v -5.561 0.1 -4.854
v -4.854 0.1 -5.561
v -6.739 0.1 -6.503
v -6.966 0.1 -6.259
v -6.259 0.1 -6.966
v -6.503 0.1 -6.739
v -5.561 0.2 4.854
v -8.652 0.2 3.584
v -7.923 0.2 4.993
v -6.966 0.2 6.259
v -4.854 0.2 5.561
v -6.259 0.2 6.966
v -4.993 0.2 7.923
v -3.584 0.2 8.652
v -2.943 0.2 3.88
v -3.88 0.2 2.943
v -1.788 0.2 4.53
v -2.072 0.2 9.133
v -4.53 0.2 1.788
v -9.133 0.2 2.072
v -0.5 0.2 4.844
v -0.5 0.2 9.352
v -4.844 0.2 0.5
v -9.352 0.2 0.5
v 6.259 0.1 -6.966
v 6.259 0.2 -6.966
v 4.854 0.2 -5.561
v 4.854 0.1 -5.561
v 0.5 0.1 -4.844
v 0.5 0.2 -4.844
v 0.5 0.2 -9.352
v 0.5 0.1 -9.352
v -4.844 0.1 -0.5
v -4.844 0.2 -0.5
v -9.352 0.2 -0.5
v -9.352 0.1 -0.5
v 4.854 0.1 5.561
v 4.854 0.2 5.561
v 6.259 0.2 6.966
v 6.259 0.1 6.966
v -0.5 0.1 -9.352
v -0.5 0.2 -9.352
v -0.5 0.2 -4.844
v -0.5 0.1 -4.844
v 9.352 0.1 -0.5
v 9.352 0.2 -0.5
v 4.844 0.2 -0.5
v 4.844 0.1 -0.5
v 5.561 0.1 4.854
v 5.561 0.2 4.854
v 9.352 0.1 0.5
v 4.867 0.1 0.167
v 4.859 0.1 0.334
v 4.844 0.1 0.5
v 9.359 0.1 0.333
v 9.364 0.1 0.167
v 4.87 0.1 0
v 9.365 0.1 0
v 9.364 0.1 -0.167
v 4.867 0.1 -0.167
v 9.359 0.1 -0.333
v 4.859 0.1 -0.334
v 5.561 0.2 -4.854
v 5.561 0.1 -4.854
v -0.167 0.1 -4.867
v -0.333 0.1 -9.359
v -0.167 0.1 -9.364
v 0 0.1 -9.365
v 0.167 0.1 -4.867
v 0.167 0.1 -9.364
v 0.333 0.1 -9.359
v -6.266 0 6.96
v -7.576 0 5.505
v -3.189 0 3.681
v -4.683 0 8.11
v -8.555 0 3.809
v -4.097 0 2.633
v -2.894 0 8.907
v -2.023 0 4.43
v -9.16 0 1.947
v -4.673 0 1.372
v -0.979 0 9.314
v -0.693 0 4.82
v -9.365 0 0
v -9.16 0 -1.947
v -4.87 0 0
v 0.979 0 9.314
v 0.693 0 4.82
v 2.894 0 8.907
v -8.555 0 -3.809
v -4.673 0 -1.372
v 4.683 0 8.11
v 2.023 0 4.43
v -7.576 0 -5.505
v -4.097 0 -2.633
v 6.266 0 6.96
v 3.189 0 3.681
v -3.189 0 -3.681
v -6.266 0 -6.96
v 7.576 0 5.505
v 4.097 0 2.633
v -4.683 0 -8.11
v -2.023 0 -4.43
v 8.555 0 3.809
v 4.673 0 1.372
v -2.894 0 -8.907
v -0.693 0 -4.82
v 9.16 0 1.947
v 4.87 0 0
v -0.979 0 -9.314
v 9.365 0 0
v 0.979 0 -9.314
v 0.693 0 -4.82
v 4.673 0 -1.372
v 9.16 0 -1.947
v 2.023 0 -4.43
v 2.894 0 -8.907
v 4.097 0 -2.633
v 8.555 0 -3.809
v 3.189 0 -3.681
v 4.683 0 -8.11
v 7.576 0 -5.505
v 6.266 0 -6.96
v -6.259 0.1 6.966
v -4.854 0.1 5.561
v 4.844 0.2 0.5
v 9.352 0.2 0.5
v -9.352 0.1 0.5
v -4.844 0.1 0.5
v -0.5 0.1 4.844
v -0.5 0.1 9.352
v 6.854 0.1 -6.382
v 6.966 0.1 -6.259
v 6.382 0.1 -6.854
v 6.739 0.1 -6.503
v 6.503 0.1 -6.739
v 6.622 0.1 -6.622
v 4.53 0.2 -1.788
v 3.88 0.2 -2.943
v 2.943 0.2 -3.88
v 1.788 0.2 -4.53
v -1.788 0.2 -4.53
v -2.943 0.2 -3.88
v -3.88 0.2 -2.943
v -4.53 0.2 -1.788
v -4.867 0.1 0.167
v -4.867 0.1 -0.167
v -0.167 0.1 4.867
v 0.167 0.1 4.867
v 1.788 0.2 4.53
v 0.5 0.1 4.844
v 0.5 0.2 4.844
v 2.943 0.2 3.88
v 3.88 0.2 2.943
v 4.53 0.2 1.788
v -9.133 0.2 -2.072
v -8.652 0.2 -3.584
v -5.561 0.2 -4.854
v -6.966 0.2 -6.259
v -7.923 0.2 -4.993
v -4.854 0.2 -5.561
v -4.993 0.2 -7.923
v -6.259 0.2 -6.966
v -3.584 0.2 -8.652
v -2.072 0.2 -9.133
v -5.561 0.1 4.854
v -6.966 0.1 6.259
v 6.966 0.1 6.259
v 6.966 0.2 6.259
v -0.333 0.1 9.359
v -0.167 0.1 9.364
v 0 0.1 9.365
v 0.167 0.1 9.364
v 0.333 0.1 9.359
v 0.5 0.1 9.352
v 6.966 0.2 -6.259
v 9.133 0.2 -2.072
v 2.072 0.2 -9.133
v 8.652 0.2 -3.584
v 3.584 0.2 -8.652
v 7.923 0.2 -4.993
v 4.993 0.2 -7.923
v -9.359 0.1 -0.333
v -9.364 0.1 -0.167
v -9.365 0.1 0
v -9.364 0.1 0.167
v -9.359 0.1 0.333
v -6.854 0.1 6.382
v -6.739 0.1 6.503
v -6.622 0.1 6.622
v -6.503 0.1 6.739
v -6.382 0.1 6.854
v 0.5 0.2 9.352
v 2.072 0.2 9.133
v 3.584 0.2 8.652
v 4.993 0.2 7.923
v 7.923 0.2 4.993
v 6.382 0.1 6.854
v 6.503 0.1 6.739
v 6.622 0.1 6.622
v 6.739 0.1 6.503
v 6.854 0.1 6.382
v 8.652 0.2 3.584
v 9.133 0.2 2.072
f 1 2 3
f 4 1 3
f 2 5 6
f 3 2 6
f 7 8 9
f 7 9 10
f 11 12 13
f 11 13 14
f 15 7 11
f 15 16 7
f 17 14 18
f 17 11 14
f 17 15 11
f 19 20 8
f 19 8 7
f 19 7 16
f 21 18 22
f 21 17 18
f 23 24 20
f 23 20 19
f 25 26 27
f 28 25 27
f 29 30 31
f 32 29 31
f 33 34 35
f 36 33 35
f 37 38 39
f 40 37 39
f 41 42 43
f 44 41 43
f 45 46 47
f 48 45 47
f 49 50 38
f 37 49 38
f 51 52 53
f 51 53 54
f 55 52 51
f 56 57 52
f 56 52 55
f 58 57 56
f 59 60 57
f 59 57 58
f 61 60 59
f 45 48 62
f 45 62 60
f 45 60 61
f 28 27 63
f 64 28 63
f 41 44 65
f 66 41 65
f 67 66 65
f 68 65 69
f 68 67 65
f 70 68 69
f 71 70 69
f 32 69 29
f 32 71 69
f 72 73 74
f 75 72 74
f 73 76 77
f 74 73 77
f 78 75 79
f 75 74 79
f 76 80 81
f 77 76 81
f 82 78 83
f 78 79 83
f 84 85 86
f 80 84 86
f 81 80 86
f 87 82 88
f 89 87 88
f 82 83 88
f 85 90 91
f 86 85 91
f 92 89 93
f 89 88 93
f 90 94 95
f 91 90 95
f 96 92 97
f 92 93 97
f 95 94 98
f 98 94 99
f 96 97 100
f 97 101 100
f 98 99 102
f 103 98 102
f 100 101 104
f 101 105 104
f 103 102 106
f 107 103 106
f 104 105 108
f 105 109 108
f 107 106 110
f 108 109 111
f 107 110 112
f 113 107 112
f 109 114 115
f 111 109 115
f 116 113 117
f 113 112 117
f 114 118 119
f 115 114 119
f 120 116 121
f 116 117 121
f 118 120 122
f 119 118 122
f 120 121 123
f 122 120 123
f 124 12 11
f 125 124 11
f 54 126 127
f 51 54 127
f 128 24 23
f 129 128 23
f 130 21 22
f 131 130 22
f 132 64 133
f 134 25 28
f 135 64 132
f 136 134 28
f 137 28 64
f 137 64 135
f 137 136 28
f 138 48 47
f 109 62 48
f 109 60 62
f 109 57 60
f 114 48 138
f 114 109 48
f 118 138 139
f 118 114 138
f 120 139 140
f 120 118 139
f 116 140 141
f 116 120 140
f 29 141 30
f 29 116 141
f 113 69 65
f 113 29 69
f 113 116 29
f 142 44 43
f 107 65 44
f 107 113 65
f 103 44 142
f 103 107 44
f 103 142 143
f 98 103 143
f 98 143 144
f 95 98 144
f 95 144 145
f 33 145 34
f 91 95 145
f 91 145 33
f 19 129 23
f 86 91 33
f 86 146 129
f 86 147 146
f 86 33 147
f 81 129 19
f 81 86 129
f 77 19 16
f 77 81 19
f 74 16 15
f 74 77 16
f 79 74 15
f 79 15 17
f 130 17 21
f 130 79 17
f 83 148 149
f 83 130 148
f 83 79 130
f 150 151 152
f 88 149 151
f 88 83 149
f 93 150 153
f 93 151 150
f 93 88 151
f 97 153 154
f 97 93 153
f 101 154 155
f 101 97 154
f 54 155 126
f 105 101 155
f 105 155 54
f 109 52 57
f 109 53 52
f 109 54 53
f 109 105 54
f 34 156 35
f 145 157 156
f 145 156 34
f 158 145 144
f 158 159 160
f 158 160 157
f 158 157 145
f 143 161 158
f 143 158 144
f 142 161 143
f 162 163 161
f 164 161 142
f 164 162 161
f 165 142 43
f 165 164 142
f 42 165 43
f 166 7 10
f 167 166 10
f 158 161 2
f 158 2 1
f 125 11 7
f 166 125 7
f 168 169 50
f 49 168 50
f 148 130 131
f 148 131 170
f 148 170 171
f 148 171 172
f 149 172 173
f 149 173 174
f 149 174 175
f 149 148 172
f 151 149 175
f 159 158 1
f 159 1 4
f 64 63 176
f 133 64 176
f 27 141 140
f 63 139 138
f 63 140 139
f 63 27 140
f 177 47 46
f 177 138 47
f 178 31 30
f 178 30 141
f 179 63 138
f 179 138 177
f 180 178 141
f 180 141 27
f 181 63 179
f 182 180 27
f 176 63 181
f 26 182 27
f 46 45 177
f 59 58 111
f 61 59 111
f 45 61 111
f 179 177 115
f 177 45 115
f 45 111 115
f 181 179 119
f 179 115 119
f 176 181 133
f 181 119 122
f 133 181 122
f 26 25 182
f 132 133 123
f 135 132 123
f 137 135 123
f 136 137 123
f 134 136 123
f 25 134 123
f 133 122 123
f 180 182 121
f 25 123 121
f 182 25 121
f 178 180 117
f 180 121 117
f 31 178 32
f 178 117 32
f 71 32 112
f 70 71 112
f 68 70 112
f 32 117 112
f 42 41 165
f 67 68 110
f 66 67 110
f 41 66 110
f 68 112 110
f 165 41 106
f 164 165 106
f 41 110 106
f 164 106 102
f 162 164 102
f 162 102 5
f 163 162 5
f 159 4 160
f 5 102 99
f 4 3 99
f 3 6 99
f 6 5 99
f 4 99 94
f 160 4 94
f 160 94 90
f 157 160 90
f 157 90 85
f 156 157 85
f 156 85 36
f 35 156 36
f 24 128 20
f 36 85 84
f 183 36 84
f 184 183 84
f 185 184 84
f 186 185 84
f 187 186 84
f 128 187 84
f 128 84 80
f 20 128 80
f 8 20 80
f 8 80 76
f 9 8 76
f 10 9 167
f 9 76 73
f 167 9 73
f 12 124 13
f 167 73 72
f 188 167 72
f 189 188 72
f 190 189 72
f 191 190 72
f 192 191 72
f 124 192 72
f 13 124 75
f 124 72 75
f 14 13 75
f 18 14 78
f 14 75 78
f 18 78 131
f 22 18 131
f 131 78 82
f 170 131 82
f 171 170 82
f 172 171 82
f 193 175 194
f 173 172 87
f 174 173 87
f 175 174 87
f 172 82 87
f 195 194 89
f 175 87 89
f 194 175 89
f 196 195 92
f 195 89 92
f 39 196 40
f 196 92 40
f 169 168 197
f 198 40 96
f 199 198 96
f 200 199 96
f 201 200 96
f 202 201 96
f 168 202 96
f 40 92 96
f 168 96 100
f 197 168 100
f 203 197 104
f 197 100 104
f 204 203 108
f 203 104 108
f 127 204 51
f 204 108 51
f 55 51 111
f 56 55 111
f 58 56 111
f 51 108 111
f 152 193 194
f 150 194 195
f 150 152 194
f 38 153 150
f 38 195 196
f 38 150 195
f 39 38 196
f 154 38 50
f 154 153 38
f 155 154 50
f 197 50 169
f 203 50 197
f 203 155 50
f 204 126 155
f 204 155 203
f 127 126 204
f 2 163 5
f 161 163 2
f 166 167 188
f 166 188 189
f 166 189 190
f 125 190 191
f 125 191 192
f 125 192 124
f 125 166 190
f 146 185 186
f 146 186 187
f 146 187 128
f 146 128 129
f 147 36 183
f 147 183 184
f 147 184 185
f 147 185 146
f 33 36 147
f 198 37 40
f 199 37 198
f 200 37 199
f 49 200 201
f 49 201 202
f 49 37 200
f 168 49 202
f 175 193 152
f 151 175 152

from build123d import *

# Parameters (mm, degrees)
CROQUIS2_R              = 9.365
CROQUIS2_R_2            = 4.87
SALIENTE_EXTRUIR1_DEPTH = 0.2
CORTAR_EXTRUIR1_DEPTH   = 0.1


with BuildPart() as part:
    # Croquis2 → Saliente-Extruir1 (new body)
    with BuildSketch(Plane(origin=(0, 0, 0), x_dir=(1, 0, 0), z_dir=(0, 1, 0))):
        Circle(CROQUIS2_R)
        Circle(CROQUIS2_R_2, mode=Mode.SUBTRACT)
    extrude(amount=SALIENTE_EXTRUIR1_DEPTH)

    # Croquis3 → Cortar-Extruir1 (cut)
    with BuildSketch(Plane(origin=(0, 0.2, 0), x_dir=(1, 0, 0), z_dir=(0, 1, 0))):
        with BuildLine():
            Line((-0.5, 9.351642904), (-0.5, 4.84426465))
            ThreePointArc((-0.5, 4.84426465), (0, 4.87), (0.5, 4.84426465))
            Line((0.5, 4.84426465), (0.5, 9.351642904))
            ThreePointArc((0.5, 9.351642904), (0.25008919, 9.36166013), (0, 9.365))
            ThreePointArc((0, 9.365), (-0.25008919, 9.36166013), (-0.5, 9.351642904))
        make_face()
        with BuildLine():
            ThreePointArc((0.5, -4.84426465), (0, -4.87), (-0.5, -4.84426465))
            Line((-0.5, -4.84426465), (-0.5, -9.351642904))
            ThreePointArc((-0.5, -9.351642904), (-0.25008919, -9.36166013), (0, -9.365))
            ThreePointArc((0, -9.365), (0.25008919, -9.36166013), (0.5, -9.351642904))
            Line((0.5, -9.351642904), (0.5, -4.84426465))
        make_face()
        with BuildLine():
            Line((-4.84426465, 0.5), (-9.351642904, 0.5))
            ThreePointArc((-9.351642904, 0.5), (-9.36166013, 0.25008919), (-9.365, 0))
            ThreePointArc((-9.365, 0), (-9.36166013, -0.25008919), (-9.351642904, -0.5))
            Line((-9.351642904, -0.5), (-4.84426465, -0.5))
            ThreePointArc((-4.84426465, -0.5), (-4.87, 0), (-4.84426465, 0.5))
        make_face()
        with BuildLine():
            Line((9.351642904, 0.5), (4.84426465, 0.5))
            ThreePointArc((4.84426465, 0.5), (4.863561907, 0.250330935), (4.87, 0))
            ThreePointArc((4.87, 0), (4.863561907, -0.250330935), (4.84426465, -0.5))
            Line((4.84426465, -0.5), (9.351642904, -0.5))
            ThreePointArc((9.351642904, -0.5), (9.36166013, -0.25008919), (9.365, 0))
            ThreePointArc((9.365, 0), (9.36166013, 0.25008919), (9.351642904, 0.5))
        make_face()
        with BuildLine():
            ThreePointArc((6.622055006, 6.622055006), (6.442853599, 6.796533124), (6.259056722, 6.966163503))
            Line((6.259056722, 6.966163503), (4.854288053, 5.561394834))
            Line((4.854288053, 5.561394834), (5.561394834, 4.854288053))
            Line((5.561394834, 4.854288053), (6.966163503, 6.259056722))
            ThreePointArc((6.966163503, 6.259056722), (6.796533124, 6.442853599), (6.622055006, 6.622055006))
        make_face()
        with BuildLine():
            Line((4.854288053, -5.561394834), (6.259056722, -6.966163503))
            ThreePointArc((6.259056722, -6.966163503), (6.442853599, -6.796533124), (6.622055006, -6.622055006))
            ThreePointArc((6.622055006, -6.622055006), (6.796533124, -6.442853599), (6.966163503, -6.259056722))
            Line((6.966163503, -6.259056722), (5.561394834, -4.854288053))
            Line((5.561394834, -4.854288053), (4.854288053, -5.561394834))
        make_face()
        with BuildLine():
            Line((-5.561394834, -4.854288053), (-6.966163503, -6.259056722))
            ThreePointArc((-6.966163503, -6.259056722), (-6.796533124, -6.442853599), (-6.622055006, -6.622055006))
            ThreePointArc((-6.622055006, -6.622055006), (-6.442853599, -6.796533124), (-6.259056722, -6.966163503))
            Line((-6.259056722, -6.966163503), (-4.854288053, -5.561394834))
            Line((-4.854288053, -5.561394834), (-5.561394834, -4.854288053))
        make_face()
        Polygon((-4.854288053, 5.561394834), (-5.561394834, 4.854288053), (-6.975608396, 6.268501615), (-6.268501615, 6.975608396), align=None)
    extrude(amount=-CORTAR_EXTRUIR1_DEPTH, mode=Mode.SUBTRACT)


solid = part.part
